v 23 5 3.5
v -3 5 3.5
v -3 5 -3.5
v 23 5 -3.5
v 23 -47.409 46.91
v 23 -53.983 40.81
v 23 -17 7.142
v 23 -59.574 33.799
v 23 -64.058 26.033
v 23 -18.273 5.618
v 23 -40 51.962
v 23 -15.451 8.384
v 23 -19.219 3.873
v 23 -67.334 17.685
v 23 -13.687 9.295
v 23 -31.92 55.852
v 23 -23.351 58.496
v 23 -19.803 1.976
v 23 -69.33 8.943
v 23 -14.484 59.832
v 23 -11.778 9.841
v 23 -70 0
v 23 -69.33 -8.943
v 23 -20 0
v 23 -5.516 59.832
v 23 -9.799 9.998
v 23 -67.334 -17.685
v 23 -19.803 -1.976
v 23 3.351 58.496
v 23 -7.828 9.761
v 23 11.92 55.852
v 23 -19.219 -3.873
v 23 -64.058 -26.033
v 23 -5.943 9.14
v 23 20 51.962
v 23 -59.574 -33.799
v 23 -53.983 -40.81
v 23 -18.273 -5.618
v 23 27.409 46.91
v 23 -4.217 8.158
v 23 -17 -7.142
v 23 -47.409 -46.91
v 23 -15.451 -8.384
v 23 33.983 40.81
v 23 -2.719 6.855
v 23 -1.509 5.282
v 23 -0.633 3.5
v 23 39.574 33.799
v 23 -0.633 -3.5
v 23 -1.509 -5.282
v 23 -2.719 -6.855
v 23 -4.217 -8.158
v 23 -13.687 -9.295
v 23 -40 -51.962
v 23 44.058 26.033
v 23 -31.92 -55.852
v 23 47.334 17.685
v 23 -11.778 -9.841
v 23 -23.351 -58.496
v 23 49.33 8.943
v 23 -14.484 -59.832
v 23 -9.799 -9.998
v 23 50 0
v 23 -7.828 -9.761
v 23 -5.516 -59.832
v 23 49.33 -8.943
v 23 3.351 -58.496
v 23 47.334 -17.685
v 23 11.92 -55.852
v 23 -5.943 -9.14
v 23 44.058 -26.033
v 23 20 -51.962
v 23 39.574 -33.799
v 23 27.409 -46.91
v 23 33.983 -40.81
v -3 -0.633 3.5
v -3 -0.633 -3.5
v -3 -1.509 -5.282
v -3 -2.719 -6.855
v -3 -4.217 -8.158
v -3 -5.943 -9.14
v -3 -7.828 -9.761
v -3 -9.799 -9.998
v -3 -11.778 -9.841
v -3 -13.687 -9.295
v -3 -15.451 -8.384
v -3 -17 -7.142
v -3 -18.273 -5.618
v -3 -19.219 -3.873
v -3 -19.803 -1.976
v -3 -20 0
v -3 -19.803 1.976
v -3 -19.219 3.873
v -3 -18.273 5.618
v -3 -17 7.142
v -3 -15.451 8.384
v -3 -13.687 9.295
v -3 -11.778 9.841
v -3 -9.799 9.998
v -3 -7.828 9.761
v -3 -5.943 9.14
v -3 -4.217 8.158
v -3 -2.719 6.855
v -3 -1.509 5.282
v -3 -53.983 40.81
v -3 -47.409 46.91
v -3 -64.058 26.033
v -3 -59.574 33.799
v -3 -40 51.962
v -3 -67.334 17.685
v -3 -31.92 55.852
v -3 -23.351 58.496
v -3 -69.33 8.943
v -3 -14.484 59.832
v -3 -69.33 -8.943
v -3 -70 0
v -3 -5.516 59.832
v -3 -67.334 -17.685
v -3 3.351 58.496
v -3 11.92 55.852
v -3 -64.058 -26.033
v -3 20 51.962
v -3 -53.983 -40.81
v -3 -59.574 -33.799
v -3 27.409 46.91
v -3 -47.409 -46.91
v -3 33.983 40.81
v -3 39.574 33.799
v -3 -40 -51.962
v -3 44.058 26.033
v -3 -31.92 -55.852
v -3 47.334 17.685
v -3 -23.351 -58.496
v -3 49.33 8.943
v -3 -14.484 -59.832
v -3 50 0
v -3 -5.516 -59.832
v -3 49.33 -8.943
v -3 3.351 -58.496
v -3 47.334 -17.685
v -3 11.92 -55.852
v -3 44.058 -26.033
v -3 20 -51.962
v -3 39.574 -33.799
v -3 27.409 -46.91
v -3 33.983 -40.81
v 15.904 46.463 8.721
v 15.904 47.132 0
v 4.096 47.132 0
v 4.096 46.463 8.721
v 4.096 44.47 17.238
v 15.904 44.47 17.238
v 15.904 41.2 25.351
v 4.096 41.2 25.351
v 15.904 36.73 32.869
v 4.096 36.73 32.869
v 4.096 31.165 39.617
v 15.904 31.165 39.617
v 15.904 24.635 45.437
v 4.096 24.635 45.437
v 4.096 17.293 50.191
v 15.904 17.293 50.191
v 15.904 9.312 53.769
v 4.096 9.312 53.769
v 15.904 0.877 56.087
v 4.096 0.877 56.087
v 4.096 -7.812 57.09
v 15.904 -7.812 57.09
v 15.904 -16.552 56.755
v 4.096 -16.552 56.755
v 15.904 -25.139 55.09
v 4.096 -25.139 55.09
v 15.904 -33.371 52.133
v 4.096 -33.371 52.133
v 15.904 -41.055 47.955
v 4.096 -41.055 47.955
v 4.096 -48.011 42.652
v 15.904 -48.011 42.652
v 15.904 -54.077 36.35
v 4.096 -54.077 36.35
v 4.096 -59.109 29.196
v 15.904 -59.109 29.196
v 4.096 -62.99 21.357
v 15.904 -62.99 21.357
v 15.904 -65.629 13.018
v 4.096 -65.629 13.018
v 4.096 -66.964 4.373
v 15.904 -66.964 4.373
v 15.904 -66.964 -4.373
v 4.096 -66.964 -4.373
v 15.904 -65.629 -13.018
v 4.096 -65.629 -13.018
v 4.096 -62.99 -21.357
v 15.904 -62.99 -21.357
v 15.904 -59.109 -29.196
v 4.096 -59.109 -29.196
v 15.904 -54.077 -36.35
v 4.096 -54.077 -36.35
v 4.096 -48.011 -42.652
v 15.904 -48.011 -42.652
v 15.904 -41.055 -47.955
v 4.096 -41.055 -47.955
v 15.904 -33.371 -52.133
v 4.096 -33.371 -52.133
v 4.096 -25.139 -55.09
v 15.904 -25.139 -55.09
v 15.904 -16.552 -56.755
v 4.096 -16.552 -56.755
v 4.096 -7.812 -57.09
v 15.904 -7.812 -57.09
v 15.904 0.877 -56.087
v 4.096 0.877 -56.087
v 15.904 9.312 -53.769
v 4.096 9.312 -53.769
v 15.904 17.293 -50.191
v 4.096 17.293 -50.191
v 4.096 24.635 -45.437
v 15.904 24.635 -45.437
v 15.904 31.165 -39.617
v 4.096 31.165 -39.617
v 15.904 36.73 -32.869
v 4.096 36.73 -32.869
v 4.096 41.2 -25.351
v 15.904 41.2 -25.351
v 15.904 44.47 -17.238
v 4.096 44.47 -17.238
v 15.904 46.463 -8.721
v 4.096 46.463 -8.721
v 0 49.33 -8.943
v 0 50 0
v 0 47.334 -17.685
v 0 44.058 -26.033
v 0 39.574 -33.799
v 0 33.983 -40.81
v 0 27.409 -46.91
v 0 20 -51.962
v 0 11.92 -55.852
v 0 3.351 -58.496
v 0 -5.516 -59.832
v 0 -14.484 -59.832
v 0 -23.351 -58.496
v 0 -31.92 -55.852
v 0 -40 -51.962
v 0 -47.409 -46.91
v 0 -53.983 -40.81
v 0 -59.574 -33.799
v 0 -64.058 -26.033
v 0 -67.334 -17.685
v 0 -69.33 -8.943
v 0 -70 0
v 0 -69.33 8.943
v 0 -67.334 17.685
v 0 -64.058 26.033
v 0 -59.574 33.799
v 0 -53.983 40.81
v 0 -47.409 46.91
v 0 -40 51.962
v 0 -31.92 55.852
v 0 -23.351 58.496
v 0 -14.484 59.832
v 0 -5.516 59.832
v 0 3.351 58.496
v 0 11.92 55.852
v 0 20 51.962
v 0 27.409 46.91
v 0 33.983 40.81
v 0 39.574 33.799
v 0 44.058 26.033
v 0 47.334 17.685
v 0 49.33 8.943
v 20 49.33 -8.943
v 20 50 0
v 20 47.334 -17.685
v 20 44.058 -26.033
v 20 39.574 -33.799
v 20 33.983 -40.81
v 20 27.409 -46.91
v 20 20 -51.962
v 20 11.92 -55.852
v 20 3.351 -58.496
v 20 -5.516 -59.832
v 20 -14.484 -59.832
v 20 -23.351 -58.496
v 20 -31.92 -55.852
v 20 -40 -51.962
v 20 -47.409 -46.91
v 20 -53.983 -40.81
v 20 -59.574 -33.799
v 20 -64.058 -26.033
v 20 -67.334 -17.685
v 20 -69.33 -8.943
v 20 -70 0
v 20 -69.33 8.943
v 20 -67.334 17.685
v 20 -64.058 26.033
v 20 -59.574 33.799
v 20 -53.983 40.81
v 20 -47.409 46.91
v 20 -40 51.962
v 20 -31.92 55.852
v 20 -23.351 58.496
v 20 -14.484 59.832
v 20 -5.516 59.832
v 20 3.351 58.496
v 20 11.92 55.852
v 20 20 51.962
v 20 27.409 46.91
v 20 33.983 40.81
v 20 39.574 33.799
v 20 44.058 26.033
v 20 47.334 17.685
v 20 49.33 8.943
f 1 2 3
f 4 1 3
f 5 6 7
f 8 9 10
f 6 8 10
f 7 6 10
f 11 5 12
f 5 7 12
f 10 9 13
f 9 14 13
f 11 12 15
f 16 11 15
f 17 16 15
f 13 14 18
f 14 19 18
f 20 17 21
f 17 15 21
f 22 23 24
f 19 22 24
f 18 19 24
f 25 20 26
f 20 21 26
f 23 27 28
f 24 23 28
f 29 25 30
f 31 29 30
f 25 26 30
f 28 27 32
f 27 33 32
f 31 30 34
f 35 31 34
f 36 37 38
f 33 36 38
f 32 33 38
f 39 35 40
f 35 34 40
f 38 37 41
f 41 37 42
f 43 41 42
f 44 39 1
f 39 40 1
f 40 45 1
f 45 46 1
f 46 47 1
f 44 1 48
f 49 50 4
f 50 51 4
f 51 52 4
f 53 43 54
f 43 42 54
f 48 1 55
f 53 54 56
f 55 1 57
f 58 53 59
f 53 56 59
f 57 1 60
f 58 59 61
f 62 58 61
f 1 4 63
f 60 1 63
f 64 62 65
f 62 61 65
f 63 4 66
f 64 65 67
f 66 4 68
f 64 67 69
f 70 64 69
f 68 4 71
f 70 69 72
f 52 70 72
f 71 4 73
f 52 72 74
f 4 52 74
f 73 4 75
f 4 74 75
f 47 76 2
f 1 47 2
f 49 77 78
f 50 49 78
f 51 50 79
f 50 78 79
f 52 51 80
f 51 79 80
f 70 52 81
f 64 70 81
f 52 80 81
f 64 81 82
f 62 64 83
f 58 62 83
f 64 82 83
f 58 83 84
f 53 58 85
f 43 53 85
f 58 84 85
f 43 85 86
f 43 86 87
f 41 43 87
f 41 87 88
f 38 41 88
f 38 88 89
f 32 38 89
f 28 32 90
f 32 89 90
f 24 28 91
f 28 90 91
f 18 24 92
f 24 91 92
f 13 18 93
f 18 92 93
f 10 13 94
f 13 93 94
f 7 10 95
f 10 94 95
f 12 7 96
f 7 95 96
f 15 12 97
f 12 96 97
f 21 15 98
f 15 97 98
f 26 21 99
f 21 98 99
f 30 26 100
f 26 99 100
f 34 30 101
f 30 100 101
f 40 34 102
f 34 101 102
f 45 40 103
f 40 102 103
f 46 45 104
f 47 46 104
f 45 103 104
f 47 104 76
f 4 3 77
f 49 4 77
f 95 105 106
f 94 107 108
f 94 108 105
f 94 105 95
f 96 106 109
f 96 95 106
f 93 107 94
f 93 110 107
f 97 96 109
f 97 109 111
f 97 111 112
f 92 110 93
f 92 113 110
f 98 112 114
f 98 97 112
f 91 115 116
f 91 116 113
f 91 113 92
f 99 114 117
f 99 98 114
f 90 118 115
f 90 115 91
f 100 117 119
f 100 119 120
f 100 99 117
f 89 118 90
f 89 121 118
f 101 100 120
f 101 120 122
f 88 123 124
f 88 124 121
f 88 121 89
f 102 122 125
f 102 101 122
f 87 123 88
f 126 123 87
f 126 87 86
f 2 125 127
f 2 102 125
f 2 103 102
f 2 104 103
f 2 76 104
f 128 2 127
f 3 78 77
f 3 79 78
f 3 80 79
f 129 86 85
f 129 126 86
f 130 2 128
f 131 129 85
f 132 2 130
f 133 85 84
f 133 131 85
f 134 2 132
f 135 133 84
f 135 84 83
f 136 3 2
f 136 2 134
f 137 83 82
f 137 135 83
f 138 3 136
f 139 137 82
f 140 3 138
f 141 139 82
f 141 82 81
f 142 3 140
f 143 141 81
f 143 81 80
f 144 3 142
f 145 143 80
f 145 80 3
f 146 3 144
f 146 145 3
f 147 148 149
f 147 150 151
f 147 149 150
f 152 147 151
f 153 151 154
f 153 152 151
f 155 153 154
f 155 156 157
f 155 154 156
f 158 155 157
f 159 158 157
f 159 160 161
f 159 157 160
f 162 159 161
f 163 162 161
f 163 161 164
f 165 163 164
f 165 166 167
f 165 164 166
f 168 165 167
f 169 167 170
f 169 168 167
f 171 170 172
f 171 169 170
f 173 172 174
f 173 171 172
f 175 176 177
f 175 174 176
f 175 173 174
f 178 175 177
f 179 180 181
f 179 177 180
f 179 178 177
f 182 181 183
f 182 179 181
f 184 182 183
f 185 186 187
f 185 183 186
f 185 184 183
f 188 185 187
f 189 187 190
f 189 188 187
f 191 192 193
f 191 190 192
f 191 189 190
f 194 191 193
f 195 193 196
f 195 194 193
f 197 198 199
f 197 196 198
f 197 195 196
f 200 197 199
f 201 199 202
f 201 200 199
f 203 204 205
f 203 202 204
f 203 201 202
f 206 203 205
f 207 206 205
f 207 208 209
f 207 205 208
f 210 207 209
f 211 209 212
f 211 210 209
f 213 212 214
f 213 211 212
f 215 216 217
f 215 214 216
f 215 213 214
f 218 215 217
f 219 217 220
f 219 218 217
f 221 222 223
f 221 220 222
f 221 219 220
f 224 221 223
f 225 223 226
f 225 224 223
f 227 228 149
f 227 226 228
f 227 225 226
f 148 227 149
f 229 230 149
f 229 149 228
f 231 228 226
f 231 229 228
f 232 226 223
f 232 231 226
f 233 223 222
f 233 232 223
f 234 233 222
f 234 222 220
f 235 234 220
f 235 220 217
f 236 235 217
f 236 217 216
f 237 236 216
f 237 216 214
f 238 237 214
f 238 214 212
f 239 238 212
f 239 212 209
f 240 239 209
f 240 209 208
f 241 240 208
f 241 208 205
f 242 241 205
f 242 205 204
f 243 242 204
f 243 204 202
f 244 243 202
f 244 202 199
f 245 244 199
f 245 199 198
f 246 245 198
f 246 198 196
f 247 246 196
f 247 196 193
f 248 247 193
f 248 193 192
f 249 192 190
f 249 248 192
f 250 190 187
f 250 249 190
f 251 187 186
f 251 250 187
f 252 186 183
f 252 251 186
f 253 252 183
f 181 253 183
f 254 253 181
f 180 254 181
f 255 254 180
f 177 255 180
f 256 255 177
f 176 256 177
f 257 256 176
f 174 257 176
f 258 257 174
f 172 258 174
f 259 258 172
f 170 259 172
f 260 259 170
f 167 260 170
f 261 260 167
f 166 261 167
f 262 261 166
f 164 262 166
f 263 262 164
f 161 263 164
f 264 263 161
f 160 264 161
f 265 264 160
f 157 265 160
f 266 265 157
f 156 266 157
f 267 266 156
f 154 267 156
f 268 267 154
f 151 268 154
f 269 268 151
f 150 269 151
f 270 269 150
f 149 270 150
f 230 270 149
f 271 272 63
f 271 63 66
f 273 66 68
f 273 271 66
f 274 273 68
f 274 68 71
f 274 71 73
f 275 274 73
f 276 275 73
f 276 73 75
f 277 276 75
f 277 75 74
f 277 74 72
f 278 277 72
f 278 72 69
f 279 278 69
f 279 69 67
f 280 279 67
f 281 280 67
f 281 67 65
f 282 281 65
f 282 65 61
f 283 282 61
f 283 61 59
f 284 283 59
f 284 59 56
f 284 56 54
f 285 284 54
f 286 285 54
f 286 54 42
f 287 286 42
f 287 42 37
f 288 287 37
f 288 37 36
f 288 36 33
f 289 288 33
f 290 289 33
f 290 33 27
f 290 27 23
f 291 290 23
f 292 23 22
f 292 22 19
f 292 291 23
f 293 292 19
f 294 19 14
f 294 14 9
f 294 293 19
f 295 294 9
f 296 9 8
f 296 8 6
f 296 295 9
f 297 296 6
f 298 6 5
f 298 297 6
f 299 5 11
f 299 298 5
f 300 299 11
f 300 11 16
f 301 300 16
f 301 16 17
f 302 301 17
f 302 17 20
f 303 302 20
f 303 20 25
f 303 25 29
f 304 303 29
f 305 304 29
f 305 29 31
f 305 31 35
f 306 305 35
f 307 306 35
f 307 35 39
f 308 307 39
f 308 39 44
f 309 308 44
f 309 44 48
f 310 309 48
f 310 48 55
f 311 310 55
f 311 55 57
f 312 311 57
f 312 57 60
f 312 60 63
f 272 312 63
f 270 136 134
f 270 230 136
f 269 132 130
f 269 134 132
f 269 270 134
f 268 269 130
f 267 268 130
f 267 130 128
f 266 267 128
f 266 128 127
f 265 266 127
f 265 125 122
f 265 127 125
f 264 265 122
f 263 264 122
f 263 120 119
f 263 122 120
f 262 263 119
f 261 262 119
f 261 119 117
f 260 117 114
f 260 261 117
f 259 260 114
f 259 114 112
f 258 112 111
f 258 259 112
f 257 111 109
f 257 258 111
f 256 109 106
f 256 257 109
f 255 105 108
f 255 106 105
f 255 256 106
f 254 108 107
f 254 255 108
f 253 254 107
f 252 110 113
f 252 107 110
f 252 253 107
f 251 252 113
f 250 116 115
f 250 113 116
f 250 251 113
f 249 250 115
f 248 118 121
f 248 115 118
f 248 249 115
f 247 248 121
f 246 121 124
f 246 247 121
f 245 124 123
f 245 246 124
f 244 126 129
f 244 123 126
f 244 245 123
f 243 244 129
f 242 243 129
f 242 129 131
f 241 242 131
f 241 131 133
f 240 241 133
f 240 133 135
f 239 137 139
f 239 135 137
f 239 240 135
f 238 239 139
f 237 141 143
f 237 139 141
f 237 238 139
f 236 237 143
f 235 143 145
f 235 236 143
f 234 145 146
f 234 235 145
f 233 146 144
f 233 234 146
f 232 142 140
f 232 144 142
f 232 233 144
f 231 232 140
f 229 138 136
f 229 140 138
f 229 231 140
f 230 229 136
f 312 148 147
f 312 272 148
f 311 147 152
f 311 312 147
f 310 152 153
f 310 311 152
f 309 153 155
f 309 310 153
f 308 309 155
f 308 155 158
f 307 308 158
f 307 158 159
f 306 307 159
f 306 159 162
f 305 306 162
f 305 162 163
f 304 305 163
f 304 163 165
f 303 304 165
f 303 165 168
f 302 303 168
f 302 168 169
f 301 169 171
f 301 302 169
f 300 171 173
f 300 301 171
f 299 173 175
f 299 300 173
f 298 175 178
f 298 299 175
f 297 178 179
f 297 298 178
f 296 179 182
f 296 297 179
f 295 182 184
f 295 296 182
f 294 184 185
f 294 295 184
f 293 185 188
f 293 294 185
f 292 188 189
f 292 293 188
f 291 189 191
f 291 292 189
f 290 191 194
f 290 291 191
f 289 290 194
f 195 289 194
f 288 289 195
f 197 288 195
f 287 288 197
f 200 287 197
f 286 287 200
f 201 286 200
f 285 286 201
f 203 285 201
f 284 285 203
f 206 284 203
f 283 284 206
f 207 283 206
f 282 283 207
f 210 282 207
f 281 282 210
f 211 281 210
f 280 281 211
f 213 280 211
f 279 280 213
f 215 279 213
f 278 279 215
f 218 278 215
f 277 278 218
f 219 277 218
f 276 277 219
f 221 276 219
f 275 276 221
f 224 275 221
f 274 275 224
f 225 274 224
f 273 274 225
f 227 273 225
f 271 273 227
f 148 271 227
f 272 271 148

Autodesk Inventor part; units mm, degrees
ref_plane "YZ Plane" through (0, 0, 0) normal (1, 0, 0) x (0, 1, 0)
ref_plane "XZ Plane" through (0, 0, 0) normal (0, 1, 0) x (-1, 0, 0)
ref_plane "XY Plane" through (0, 0, 0) normal (0, 0, 1) x (1, 0, 0)
sketch "Sketch1" plane through (0, 0, 0) normal (0, 0, 1) x (1, 0, 0)
  line L0 (0, 0) -> (0, 50)
  line L1 (20, 50) -> (20, 0)
  line L2 (20, 0) -> (0, 0)
  line L3 (0, -10) -> (-48.3632, -10)
  line L4 (0, 50) -> (4.0958, 47.1321)
  line L5 (20, 50) -> (15.9042, 47.1321)
  line L6 (4.0958, 47.1321) -> (15.9042, 47.1321)
  dimension "d3" = 10
revolve "Revolution1" add sketch "Sketch1" angle 360 about axis through (0, -10, 0) along (-1, 0, 0)
thicken "Thicken1" operation add thickness 3 both sides no extend neighbours no toward (-1, 0, 0) faces at (0, -50.5351, 14.7961)
thicken "Thicken2" operation add thickness 3 both sides no extend neighbours no toward (1, 0, 0) faces at (20, -50.5351, -14.7961)
sketch "Sketch2" plane through (-3, -10, 0) normal (-1, 0, 0) x (0, 0, 1)
  line L0 (-3.5, 5) -> (3.5, 5)
  line L1 (3.5, 5) -> (3.5, 15)
  line L2 (3.5, 15) -> (-3.5, 15)
  line L3 (-3.5, 15) -> (-3.5, 5)
  line L4 (-3.5, 5) -> (3.5, 15) construction
  line L5 (3.5, 5) -> (-3.5, 15) construction
  point P0 (0, 10)
  dimension "d11" = 7
  dimension "d12" = 10
extrude "Extrusion1" cut sketch "Sketch2" against normal through all
properties part number "POLEA"
